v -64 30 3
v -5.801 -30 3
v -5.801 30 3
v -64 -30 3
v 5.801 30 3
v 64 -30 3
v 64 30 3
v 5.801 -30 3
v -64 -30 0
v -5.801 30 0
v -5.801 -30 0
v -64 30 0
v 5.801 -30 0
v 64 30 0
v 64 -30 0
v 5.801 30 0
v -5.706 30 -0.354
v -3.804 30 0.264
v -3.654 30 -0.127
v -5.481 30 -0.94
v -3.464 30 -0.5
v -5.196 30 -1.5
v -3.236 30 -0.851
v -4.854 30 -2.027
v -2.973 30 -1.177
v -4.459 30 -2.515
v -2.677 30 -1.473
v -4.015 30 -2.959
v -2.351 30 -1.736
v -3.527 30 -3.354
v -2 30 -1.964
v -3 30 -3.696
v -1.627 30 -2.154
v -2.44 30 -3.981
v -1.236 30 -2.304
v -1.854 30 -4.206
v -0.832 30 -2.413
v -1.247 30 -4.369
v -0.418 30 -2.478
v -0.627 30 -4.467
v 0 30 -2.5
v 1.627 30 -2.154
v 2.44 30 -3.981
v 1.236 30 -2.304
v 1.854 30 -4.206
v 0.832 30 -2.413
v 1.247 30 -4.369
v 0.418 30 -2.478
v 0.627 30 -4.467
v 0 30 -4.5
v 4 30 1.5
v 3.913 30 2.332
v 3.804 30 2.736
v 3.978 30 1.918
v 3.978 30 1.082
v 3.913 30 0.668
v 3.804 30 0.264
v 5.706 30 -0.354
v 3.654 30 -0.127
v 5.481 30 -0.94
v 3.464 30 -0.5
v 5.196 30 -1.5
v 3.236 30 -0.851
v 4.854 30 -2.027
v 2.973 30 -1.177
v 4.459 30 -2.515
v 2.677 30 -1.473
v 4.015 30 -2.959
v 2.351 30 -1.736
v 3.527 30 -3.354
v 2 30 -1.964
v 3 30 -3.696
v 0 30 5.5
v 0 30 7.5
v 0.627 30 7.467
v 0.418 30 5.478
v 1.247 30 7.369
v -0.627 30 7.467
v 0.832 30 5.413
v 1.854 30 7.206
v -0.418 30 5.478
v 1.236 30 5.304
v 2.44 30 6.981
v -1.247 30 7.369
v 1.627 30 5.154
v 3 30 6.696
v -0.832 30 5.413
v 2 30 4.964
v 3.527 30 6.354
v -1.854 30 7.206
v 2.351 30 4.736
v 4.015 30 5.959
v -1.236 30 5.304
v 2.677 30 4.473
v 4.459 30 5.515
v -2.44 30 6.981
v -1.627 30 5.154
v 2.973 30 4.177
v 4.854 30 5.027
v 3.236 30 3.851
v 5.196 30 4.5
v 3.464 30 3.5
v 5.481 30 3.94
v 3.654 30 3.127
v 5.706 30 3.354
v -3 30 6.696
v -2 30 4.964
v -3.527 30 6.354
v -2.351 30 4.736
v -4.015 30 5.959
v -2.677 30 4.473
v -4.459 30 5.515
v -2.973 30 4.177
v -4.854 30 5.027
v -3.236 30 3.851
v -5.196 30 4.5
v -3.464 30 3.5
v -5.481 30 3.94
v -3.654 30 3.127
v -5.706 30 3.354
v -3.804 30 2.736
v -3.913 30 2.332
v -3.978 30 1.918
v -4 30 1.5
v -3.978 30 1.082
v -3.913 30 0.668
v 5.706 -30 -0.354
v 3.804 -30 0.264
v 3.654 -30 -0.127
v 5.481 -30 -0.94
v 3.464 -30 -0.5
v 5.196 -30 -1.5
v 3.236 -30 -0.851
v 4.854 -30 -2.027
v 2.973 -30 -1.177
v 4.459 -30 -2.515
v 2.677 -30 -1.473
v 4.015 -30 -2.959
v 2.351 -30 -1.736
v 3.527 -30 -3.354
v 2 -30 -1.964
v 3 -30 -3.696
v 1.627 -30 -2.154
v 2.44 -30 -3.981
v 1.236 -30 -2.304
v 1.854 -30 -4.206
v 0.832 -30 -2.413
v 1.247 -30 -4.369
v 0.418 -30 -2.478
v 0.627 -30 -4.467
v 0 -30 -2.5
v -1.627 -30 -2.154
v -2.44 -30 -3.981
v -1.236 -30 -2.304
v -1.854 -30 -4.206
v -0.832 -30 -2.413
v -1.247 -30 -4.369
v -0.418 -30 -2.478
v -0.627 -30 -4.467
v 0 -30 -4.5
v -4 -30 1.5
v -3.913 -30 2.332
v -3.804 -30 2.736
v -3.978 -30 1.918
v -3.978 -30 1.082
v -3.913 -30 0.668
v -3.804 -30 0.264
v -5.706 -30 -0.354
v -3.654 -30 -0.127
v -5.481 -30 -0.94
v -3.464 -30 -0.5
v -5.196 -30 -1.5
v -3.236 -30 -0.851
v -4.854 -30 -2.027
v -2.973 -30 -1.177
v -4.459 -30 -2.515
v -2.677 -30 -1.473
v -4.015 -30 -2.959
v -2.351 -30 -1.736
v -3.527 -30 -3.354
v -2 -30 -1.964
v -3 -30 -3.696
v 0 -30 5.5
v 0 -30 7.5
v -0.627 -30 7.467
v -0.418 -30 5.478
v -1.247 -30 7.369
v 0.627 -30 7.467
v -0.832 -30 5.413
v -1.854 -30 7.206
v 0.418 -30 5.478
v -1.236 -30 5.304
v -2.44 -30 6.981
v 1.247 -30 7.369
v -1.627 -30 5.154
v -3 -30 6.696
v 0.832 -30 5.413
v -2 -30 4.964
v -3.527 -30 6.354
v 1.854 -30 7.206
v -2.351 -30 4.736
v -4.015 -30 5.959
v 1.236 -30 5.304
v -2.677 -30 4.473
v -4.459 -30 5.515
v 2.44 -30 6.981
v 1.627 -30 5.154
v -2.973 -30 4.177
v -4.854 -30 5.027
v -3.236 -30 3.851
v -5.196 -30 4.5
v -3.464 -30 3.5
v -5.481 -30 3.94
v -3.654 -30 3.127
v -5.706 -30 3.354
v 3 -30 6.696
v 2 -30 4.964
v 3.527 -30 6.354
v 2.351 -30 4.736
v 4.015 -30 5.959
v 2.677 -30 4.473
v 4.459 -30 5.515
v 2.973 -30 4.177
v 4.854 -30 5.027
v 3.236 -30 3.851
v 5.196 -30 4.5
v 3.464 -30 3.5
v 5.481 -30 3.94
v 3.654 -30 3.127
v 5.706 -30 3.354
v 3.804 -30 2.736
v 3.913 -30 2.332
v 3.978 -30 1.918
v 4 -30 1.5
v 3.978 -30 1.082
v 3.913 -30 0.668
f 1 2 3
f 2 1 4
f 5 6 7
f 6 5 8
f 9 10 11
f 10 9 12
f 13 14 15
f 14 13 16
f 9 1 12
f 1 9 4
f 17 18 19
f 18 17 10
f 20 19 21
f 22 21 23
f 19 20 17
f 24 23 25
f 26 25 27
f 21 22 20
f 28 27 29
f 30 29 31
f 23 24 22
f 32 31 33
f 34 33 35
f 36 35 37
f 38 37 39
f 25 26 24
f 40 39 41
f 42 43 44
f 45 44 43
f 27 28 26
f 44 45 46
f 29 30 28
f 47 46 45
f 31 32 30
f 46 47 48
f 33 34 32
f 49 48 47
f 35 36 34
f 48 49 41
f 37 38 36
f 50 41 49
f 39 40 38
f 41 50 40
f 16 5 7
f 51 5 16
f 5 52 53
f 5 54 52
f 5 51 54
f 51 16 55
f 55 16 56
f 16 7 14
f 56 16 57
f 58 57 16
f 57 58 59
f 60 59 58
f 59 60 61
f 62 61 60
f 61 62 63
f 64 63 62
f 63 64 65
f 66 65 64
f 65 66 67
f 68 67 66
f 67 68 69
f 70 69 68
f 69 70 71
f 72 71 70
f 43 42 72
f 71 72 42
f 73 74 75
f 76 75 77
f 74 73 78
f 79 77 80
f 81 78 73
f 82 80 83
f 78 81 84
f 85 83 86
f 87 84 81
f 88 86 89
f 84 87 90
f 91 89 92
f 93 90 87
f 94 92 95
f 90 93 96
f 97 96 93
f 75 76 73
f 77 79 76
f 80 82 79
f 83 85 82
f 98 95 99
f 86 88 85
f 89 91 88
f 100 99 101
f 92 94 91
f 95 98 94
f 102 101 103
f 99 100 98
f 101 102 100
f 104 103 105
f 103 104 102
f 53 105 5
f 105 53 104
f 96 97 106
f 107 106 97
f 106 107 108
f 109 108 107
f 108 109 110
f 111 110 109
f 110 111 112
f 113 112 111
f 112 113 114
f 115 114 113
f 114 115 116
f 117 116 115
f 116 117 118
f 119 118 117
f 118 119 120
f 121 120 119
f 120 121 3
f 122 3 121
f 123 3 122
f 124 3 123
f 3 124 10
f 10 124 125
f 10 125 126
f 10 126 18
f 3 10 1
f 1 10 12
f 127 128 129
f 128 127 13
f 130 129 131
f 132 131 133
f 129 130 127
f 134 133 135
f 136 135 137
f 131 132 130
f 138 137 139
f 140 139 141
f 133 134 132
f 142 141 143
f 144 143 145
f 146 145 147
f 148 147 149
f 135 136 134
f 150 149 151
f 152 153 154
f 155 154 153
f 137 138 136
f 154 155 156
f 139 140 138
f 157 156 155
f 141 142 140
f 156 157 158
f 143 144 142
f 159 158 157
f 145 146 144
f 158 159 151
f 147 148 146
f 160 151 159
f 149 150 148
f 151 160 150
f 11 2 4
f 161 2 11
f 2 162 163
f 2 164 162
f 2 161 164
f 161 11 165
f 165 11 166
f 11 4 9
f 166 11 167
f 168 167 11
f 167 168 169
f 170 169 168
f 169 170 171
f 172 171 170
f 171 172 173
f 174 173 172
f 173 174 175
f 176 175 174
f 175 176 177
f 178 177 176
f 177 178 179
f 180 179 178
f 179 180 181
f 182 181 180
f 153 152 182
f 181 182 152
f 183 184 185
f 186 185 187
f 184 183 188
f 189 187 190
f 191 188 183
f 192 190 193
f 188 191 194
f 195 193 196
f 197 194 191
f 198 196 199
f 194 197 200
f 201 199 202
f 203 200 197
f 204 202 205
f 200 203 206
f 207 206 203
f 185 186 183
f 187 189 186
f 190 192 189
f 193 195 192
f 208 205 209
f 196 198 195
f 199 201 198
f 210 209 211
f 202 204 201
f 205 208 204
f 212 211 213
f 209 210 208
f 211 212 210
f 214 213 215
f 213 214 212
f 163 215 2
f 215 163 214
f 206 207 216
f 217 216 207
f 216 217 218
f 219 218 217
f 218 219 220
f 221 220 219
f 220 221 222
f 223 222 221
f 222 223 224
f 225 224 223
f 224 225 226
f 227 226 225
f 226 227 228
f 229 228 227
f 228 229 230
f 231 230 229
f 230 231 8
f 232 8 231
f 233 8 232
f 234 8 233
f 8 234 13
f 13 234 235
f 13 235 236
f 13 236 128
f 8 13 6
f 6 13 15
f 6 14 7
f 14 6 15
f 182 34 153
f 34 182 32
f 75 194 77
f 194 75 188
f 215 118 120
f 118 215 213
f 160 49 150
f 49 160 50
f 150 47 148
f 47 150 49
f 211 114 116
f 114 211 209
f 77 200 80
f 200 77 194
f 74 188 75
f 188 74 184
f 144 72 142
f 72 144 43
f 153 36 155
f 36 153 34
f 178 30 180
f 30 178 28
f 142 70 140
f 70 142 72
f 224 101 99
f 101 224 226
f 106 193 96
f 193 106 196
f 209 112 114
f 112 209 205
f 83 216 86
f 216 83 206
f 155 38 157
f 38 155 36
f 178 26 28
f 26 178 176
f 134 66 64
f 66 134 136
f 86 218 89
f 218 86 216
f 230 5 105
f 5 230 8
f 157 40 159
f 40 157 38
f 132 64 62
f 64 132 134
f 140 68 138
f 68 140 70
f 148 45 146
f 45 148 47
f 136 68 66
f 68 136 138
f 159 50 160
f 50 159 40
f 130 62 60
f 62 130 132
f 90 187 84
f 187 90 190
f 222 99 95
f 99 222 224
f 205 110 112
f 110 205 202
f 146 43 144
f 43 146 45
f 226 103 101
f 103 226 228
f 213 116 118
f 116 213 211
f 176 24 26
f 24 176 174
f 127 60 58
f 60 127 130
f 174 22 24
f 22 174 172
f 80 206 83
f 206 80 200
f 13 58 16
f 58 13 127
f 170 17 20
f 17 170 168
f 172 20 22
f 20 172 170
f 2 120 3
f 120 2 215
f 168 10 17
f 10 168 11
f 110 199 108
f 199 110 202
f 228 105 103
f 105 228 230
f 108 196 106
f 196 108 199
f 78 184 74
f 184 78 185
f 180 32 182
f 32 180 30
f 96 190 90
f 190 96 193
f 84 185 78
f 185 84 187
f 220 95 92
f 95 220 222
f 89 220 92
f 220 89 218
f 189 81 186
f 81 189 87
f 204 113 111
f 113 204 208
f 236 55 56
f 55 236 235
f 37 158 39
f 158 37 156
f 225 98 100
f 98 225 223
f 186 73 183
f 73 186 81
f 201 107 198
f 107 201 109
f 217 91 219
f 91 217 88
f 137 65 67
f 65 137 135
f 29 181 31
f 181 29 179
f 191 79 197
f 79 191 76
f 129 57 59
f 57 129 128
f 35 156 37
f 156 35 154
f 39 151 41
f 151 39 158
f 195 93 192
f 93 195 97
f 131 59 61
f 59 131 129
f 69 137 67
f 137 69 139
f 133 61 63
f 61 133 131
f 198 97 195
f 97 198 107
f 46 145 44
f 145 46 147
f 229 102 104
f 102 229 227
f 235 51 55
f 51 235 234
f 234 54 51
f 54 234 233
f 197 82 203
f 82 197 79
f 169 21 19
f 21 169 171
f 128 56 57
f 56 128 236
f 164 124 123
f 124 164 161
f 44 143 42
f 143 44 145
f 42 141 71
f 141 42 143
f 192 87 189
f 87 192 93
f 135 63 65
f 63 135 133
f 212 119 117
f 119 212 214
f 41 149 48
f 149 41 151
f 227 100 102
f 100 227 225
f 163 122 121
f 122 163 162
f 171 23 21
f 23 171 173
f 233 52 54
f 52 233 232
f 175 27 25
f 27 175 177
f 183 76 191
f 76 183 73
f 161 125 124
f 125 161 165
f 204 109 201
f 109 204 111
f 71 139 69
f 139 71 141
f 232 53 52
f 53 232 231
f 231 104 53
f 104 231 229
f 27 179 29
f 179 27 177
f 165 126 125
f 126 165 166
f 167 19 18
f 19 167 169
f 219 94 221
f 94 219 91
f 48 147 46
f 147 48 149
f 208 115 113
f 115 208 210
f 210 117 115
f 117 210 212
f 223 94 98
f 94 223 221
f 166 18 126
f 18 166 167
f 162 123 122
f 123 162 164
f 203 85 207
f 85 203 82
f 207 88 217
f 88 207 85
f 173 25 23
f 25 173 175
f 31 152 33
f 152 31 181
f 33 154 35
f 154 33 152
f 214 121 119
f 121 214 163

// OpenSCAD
// Compact plate hinge.
$fn = 60;
eps = 0.02;
leaf_l = 64;
width = 60;
pin_d = 8;
leaf_t = 3;
difference() {
    union() {
        translate([-leaf_l,-width/2,0]) cube([leaf_l,width,leaf_t]);
        translate([0,-width/2,0]) cube([leaf_l,width,leaf_t]);
        translate([0,-width/2,leaf_t/2]) rotate([-90,0,0]) cylinder(d=pin_d+4,h=width);
    }
    translate([0,-width/2-eps,leaf_t/2]) rotate([-90,0,0]) cylinder(d=pin_d,h=width+2*eps);
}
